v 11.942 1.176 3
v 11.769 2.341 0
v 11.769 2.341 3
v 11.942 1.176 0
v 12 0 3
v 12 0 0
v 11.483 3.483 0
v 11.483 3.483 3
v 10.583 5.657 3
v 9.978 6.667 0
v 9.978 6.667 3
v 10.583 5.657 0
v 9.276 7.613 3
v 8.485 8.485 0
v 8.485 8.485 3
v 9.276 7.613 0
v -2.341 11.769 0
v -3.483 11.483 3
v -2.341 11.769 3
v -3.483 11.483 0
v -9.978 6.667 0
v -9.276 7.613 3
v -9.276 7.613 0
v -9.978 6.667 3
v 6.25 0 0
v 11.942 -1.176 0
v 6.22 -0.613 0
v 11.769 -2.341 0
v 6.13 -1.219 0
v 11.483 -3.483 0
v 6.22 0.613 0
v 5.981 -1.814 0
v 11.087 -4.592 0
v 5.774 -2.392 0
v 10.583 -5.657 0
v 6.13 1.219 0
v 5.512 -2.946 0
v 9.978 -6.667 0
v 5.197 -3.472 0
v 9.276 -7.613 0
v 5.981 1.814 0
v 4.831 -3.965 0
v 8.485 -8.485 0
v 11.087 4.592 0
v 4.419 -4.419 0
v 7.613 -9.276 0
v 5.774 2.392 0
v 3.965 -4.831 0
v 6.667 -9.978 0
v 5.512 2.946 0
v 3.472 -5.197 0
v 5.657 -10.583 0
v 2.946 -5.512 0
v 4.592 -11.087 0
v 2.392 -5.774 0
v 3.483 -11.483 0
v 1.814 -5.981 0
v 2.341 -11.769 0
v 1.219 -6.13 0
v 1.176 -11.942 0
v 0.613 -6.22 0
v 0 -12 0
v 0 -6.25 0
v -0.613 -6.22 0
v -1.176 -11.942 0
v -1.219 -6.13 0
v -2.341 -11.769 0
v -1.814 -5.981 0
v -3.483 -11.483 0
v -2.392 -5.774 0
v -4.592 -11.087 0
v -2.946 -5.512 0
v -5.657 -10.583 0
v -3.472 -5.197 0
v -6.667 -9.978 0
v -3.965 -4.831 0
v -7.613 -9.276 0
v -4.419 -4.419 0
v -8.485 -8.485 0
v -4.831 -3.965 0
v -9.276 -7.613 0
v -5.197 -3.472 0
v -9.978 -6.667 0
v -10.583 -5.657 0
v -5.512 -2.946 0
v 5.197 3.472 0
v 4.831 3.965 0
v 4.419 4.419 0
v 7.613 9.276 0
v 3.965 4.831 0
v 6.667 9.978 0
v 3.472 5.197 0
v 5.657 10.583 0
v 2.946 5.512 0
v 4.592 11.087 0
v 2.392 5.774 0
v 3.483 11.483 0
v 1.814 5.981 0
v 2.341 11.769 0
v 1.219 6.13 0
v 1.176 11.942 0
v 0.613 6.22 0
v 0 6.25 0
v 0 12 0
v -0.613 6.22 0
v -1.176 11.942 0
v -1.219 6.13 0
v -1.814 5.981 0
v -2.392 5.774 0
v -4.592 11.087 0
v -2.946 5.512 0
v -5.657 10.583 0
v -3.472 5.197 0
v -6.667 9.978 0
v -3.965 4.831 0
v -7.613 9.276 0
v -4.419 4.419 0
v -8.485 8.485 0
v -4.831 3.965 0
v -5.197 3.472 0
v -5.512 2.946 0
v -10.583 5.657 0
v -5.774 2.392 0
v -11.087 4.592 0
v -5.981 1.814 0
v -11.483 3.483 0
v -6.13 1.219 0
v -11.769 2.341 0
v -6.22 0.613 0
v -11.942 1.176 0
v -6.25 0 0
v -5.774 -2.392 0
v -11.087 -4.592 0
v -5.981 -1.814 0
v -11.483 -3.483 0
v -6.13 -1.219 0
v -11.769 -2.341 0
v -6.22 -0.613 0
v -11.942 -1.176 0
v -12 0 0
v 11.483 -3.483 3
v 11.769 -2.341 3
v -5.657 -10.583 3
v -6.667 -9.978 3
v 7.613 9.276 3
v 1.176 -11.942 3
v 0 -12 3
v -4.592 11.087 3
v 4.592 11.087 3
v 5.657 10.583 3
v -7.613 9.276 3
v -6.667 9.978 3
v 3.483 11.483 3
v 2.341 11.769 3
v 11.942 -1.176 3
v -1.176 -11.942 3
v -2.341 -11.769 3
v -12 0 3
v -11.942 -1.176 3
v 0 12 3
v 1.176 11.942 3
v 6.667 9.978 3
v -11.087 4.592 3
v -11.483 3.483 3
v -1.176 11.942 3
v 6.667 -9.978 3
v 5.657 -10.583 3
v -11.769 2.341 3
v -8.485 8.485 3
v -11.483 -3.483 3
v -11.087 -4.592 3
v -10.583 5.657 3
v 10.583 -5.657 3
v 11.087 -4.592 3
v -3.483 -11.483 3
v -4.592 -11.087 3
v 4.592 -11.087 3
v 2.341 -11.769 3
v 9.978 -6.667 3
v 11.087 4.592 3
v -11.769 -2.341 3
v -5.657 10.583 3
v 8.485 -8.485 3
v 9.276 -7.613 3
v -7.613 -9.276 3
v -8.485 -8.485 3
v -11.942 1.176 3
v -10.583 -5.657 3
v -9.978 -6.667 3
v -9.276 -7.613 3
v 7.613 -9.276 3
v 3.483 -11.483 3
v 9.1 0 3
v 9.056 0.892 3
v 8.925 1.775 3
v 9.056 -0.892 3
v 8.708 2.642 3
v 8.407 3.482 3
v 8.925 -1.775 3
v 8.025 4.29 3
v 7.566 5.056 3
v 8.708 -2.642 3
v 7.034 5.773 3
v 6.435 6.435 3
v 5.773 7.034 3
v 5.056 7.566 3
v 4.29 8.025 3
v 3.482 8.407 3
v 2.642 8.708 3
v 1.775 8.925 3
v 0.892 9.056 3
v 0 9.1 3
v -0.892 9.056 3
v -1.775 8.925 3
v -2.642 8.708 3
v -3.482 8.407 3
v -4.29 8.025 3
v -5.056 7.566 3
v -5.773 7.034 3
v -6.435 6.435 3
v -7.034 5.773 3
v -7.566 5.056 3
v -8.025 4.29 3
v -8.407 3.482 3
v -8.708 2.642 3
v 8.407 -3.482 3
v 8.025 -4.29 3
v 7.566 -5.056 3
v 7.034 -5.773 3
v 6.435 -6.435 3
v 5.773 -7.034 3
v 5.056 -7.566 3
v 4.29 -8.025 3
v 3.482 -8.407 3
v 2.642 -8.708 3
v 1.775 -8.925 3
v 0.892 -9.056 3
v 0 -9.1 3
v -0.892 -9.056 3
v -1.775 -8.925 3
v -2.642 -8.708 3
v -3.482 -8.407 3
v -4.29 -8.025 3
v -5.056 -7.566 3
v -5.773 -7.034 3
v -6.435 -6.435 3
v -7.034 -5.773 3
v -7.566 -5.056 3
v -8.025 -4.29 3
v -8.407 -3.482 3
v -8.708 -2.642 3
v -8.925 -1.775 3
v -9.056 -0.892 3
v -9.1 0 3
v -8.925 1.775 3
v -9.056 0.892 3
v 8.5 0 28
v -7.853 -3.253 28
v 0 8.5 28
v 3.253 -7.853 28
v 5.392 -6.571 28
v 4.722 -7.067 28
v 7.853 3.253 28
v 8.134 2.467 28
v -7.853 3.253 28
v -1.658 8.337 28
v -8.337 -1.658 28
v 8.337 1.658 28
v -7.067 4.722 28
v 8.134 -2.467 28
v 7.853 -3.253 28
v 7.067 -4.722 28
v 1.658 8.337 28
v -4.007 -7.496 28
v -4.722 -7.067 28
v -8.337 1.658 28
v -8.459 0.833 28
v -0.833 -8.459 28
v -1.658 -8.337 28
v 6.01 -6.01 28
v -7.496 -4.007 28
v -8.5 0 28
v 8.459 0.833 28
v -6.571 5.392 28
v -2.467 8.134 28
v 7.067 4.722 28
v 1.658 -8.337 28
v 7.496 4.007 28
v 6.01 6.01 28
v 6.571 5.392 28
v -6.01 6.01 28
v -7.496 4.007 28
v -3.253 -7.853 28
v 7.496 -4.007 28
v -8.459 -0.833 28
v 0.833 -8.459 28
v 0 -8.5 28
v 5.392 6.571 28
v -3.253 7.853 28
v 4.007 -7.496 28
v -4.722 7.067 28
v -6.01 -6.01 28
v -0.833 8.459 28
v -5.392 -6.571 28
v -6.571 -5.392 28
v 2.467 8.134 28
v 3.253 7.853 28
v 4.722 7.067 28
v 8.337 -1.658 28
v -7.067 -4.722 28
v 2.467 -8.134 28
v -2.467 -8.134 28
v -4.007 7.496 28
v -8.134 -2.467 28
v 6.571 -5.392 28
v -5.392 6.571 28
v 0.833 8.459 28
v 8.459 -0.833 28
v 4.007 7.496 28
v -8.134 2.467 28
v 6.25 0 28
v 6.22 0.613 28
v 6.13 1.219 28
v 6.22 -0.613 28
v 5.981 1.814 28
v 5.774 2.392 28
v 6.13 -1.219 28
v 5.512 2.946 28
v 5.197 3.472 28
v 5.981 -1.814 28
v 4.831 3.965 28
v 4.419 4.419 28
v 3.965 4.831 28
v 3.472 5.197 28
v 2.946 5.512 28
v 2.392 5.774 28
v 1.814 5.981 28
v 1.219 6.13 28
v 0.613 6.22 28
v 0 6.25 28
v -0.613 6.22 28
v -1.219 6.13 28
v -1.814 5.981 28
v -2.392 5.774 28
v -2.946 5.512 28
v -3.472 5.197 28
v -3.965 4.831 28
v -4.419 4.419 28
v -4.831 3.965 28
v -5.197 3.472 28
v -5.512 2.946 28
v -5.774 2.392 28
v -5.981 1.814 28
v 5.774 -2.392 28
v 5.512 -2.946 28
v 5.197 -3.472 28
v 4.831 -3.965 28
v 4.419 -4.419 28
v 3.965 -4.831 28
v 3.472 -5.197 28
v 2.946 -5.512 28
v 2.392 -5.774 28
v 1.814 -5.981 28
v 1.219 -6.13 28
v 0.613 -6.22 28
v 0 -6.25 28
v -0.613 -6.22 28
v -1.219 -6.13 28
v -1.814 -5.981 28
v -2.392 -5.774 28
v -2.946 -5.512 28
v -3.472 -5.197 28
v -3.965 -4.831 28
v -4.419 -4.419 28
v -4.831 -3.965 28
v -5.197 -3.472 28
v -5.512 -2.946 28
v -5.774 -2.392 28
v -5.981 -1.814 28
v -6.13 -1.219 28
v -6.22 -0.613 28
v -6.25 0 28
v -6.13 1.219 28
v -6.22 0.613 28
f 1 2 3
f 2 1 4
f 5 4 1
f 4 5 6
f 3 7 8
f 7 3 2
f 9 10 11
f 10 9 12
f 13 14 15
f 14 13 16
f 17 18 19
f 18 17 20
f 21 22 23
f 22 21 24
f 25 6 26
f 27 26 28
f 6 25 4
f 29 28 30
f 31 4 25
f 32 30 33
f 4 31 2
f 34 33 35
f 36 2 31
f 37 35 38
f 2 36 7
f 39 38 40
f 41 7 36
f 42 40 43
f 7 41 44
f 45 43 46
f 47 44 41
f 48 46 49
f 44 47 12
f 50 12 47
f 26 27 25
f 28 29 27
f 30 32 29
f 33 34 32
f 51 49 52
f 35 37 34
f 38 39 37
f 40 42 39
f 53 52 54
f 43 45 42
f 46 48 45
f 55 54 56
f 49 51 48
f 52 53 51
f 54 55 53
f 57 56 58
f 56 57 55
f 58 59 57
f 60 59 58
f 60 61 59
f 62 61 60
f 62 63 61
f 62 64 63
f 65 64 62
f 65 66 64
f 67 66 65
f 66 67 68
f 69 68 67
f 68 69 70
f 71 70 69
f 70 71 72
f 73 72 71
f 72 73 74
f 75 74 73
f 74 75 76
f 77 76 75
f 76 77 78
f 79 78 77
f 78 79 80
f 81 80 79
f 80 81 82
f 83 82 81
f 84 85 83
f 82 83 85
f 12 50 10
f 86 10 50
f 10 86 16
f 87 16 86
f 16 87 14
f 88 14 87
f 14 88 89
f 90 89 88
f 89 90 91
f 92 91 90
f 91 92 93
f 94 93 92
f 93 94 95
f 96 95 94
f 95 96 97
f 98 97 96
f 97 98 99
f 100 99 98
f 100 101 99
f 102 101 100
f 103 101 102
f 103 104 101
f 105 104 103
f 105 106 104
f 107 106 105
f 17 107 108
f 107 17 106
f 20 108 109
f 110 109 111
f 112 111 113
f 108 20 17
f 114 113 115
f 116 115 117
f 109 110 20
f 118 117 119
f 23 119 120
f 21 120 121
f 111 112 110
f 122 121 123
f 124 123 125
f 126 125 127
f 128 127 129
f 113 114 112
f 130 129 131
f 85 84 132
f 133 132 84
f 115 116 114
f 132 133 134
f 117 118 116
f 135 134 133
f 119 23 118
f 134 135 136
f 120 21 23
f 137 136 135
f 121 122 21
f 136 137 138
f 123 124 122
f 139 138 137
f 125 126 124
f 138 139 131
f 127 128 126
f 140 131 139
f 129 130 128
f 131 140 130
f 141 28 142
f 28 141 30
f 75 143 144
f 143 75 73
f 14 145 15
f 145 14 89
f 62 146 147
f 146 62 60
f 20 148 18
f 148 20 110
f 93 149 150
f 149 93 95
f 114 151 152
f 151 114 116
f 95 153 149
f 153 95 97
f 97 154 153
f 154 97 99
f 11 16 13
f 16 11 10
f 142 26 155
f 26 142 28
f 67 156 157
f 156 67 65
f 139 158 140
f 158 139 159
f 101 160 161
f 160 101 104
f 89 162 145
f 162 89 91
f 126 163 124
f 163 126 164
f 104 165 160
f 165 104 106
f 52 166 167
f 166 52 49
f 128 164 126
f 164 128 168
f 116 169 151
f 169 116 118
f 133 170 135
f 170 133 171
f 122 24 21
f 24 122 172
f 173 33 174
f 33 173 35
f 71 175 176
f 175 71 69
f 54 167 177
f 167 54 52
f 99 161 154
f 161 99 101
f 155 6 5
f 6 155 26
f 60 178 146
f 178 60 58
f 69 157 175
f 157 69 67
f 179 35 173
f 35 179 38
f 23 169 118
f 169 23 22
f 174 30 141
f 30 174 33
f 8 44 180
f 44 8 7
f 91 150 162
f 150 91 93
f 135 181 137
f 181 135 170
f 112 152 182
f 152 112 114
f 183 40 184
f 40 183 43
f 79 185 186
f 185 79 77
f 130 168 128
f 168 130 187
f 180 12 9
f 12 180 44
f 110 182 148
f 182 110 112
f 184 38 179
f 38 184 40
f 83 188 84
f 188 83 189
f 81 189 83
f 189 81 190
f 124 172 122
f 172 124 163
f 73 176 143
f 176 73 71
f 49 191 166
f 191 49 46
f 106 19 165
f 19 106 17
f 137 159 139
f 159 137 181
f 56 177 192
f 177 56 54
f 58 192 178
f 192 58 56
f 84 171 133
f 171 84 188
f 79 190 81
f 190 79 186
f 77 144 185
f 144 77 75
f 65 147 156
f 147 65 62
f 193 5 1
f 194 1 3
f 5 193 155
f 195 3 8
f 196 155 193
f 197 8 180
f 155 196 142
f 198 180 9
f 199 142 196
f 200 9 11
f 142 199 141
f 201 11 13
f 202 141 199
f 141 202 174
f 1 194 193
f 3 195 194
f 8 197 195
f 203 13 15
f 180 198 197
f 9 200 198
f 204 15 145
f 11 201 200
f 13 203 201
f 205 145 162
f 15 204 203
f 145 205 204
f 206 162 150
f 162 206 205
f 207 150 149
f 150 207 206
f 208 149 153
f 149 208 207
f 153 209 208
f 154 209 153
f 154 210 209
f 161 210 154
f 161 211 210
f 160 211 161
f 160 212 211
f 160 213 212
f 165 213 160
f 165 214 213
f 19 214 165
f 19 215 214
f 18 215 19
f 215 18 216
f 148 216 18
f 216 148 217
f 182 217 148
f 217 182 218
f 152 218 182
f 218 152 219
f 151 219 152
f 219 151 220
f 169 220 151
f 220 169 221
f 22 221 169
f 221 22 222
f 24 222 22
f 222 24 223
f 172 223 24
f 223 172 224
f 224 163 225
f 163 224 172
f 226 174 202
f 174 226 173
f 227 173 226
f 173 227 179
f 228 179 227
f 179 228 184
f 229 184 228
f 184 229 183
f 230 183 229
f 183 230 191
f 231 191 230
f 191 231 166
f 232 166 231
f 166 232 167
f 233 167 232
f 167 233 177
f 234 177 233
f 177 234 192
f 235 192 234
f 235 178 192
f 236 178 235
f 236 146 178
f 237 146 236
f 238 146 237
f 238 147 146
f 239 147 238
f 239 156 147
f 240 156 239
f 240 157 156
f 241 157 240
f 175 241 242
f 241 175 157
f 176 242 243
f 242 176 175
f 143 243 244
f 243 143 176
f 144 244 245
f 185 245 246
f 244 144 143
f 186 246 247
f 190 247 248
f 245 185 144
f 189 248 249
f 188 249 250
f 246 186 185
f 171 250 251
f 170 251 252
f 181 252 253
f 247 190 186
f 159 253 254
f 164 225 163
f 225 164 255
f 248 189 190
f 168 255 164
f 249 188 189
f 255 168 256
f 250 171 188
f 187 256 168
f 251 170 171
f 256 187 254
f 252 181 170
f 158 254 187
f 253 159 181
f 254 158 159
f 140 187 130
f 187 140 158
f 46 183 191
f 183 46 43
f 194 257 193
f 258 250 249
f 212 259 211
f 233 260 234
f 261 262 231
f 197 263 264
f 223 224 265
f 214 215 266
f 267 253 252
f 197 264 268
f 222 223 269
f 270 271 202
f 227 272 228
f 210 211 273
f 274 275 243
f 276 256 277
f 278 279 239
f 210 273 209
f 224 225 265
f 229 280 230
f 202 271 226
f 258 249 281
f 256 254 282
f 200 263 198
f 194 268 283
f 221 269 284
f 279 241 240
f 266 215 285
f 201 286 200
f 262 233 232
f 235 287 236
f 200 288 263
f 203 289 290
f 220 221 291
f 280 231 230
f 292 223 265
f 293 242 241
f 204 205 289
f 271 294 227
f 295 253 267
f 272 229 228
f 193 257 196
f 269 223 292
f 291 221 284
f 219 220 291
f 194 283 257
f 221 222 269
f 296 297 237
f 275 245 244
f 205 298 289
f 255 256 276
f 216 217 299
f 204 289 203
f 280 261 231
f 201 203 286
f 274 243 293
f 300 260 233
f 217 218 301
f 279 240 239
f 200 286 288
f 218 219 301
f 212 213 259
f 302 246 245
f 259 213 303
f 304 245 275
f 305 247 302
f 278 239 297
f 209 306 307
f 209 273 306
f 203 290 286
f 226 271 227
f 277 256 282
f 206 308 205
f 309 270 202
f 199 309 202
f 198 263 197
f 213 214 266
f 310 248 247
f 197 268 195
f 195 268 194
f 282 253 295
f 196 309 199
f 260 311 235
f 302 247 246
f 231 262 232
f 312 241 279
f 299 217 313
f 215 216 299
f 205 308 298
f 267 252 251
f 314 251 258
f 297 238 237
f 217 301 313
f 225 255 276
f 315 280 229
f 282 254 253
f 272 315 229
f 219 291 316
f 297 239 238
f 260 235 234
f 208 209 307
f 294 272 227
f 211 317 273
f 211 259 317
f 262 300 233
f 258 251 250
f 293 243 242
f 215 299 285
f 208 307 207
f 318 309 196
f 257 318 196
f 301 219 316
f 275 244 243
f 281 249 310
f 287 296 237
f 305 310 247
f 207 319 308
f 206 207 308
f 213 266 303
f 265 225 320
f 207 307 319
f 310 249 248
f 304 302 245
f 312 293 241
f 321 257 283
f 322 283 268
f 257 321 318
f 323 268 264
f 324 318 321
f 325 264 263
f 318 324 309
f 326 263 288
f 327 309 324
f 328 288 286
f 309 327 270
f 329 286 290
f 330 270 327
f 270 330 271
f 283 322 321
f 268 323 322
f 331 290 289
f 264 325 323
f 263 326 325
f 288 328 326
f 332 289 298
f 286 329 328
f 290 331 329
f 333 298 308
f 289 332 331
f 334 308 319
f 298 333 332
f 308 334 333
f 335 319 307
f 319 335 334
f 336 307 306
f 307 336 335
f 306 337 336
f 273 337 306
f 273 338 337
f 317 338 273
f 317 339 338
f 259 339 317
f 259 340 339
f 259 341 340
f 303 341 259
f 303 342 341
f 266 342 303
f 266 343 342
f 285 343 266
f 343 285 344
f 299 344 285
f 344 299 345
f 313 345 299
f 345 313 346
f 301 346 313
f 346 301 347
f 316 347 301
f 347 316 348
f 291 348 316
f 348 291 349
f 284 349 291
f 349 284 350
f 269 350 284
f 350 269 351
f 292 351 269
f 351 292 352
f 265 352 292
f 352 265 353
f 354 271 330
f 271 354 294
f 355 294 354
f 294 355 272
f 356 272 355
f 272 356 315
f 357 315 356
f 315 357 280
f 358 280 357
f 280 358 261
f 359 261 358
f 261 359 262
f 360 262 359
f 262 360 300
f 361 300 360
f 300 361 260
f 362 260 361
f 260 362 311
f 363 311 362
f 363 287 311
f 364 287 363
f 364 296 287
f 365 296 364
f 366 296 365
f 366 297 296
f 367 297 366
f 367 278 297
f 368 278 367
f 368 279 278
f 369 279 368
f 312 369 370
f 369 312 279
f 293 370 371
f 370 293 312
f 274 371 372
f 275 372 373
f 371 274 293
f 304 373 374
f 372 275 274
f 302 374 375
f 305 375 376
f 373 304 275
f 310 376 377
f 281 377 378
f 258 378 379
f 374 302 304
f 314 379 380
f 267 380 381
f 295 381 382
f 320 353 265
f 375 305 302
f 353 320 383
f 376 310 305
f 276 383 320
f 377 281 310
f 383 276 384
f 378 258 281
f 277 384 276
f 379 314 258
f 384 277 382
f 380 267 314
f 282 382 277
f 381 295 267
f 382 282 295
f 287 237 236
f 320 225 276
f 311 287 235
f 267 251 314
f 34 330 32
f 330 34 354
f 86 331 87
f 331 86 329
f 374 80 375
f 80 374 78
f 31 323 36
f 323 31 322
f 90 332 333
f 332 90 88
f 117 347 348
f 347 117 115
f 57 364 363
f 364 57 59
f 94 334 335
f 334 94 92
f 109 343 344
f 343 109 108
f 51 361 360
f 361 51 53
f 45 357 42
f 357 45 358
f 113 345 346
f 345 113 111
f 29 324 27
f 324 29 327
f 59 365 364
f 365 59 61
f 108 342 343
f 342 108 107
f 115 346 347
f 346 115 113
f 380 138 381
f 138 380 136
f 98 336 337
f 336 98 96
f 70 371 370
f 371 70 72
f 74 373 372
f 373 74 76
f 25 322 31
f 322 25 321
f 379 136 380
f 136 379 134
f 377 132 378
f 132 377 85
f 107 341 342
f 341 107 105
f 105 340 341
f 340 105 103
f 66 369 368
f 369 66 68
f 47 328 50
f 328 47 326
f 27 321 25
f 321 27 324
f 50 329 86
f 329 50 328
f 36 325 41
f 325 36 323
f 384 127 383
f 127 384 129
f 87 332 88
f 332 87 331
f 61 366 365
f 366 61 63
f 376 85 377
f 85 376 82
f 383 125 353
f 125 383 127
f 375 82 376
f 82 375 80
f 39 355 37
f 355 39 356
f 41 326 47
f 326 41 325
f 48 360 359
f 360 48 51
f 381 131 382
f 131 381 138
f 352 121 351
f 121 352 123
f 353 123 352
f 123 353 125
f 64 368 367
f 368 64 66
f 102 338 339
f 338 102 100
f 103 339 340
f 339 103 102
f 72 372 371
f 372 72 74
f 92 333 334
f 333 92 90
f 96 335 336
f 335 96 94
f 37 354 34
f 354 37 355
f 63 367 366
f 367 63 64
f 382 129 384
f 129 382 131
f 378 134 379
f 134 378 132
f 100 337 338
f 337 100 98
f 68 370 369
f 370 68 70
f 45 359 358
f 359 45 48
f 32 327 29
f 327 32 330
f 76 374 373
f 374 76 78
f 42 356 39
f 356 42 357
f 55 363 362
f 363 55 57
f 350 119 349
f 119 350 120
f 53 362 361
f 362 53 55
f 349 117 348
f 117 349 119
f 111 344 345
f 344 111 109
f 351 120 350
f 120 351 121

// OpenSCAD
shoulderH=3;
shoulderR=12;
plugDepth=25;
plugBoreR=6.25;
poke=.004;  // poke-through value
$fn=64;

difference() {
    union() {
        cylinder(h=shoulderH, r=shoulderR, center=false);
        translate([0,0,shoulderH]) {
            cylinder(h=plugDepth, r1=9.1, r2=8.5, center=false);
        }
    }
    translate([0,0,-poke]) {  // start slightly below intersecting solid
        // poke through, height of should, plug depth, poke through other end
        cylinder(h=poke+shoulderH+plugDepth+poke, r=plugBoreR, center=false);
    }
}
